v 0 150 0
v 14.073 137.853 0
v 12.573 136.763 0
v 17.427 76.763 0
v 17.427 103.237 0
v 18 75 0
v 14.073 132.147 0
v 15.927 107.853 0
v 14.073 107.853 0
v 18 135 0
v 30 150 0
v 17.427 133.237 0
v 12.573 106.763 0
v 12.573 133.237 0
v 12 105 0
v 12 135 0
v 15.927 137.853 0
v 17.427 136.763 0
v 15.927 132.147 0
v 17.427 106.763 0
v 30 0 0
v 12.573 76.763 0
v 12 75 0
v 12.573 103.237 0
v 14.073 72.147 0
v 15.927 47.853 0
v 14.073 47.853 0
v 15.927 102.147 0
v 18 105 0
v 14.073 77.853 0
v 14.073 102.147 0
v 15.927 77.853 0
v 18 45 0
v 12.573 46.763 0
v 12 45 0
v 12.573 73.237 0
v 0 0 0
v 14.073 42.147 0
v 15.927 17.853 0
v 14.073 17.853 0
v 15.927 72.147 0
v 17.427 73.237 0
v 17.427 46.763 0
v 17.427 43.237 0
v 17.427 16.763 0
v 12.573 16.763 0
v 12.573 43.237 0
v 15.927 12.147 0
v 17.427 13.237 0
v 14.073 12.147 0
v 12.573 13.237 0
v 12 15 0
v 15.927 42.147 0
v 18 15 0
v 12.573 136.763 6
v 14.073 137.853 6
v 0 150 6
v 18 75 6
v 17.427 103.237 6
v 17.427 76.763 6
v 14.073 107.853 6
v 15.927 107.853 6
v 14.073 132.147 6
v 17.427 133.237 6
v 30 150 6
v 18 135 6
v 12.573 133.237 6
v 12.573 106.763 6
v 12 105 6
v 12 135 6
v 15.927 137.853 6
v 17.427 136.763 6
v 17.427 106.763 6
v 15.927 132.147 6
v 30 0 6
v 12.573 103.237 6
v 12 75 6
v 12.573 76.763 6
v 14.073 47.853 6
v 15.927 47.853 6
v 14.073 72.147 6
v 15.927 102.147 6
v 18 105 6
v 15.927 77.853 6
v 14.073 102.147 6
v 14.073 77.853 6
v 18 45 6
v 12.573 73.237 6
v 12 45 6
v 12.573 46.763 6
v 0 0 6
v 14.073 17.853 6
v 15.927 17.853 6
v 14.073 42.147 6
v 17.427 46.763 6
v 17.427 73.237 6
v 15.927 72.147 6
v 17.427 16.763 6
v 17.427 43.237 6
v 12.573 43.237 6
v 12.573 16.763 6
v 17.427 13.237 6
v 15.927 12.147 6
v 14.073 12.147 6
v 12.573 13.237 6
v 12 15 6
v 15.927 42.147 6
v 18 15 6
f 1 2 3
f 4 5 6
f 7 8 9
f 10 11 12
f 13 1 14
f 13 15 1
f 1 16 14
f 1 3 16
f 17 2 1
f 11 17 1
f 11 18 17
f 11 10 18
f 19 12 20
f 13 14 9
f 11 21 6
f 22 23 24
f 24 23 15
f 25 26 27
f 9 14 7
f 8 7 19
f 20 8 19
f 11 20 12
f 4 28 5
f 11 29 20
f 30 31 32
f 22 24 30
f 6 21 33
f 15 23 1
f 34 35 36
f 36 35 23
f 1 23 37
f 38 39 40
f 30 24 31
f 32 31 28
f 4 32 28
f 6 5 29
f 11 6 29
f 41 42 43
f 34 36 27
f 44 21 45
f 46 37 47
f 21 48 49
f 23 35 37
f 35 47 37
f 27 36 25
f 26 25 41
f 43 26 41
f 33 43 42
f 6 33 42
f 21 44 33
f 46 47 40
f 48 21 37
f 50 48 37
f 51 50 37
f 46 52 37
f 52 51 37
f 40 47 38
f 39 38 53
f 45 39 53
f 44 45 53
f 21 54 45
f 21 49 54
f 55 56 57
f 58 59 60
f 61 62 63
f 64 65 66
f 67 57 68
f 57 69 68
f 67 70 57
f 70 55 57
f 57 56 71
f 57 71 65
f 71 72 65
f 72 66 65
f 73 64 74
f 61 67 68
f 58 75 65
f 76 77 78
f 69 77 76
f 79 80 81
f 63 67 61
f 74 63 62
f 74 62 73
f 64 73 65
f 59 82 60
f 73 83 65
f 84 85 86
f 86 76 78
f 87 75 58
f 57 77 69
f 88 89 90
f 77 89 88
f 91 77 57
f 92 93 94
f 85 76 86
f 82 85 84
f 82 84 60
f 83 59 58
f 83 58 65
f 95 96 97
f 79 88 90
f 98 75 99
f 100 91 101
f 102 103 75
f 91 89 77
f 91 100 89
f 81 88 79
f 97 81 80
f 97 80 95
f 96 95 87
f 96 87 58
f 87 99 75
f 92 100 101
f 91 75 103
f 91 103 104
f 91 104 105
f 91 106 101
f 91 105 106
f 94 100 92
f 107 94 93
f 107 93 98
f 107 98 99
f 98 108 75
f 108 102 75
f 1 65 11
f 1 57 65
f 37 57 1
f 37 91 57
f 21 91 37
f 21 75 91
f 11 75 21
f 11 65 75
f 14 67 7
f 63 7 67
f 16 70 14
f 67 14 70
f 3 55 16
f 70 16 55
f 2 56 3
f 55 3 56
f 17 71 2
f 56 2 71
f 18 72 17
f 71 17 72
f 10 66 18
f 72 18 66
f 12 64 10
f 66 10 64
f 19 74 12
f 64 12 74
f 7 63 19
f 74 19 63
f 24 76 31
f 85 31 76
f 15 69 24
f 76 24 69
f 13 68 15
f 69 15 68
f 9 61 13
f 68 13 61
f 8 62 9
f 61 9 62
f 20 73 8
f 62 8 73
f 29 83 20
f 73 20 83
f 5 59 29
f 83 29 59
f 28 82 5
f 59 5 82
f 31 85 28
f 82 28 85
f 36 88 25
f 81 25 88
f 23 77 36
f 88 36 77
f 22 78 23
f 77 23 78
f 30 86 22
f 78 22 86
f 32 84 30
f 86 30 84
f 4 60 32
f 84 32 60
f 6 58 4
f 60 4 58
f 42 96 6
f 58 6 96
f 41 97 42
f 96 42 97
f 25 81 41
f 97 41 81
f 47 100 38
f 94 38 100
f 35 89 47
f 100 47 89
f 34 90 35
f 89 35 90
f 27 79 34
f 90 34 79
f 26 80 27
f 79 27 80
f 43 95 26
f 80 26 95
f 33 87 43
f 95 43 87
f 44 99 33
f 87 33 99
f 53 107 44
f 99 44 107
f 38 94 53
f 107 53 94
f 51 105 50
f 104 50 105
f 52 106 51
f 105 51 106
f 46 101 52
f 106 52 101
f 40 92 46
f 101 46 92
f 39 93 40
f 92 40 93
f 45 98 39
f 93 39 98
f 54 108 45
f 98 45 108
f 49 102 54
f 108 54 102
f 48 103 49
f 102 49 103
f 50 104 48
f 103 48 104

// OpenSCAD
// file: ../../lib/profile_connector.scad
module profile_connector(profile_width=30, num_holes=4, hole_diam=6, thickness=6) {
    width = profile_width;
    length = num_holes * profile_width;

    color([0, 0.5, 0.8, 0.5]) {
        linear_extrude(thickness) {
            difference() {
                square([width, length]);
                union() {
                    for (i = [0 : num_holes-1]) {
                        translate([width/2, width/2 + i * width]) circle(d=hole_diam);
                    }
                }
            }
        }
    }
}

module profile_connector_double(profile_width=30, num_holes=4, hole_diam=6, thickness=6) {
    width = profile_width * 2;
    length = num_holes * profile_width;

    color([0, 0.5, 0.8, 0.5]) {
        linear_extrude(thickness) {
            difference() {
                square([width, length]);
                union() {
                    for (i = [0 : num_holes-1]) {
                        translate([width/4, width/4 + i * width/2]) circle(d=hole_diam);
                        translate([3*width/4, width/4 + i * width/2]) circle(d=hole_diam);
                    }
                }
            }
        }
    }
}

module profile_connector_E30x120() {
    profile_connector(profile_width=30, num_holes=4, hole_diam=6, thickness=6);
}

module profile_connector_E30x150() {
    profile_connector(profile_width=30, num_holes=5, hole_diam=6, thickness=6);
}

module profile_connector_E60x120() {
    profile_connector_double(profile_width=30, num_holes=4, hole_diam=6, thickness=6);
}
// main file
include <../../lib/profile_connector.scad>

profile_connector_E30x150();
